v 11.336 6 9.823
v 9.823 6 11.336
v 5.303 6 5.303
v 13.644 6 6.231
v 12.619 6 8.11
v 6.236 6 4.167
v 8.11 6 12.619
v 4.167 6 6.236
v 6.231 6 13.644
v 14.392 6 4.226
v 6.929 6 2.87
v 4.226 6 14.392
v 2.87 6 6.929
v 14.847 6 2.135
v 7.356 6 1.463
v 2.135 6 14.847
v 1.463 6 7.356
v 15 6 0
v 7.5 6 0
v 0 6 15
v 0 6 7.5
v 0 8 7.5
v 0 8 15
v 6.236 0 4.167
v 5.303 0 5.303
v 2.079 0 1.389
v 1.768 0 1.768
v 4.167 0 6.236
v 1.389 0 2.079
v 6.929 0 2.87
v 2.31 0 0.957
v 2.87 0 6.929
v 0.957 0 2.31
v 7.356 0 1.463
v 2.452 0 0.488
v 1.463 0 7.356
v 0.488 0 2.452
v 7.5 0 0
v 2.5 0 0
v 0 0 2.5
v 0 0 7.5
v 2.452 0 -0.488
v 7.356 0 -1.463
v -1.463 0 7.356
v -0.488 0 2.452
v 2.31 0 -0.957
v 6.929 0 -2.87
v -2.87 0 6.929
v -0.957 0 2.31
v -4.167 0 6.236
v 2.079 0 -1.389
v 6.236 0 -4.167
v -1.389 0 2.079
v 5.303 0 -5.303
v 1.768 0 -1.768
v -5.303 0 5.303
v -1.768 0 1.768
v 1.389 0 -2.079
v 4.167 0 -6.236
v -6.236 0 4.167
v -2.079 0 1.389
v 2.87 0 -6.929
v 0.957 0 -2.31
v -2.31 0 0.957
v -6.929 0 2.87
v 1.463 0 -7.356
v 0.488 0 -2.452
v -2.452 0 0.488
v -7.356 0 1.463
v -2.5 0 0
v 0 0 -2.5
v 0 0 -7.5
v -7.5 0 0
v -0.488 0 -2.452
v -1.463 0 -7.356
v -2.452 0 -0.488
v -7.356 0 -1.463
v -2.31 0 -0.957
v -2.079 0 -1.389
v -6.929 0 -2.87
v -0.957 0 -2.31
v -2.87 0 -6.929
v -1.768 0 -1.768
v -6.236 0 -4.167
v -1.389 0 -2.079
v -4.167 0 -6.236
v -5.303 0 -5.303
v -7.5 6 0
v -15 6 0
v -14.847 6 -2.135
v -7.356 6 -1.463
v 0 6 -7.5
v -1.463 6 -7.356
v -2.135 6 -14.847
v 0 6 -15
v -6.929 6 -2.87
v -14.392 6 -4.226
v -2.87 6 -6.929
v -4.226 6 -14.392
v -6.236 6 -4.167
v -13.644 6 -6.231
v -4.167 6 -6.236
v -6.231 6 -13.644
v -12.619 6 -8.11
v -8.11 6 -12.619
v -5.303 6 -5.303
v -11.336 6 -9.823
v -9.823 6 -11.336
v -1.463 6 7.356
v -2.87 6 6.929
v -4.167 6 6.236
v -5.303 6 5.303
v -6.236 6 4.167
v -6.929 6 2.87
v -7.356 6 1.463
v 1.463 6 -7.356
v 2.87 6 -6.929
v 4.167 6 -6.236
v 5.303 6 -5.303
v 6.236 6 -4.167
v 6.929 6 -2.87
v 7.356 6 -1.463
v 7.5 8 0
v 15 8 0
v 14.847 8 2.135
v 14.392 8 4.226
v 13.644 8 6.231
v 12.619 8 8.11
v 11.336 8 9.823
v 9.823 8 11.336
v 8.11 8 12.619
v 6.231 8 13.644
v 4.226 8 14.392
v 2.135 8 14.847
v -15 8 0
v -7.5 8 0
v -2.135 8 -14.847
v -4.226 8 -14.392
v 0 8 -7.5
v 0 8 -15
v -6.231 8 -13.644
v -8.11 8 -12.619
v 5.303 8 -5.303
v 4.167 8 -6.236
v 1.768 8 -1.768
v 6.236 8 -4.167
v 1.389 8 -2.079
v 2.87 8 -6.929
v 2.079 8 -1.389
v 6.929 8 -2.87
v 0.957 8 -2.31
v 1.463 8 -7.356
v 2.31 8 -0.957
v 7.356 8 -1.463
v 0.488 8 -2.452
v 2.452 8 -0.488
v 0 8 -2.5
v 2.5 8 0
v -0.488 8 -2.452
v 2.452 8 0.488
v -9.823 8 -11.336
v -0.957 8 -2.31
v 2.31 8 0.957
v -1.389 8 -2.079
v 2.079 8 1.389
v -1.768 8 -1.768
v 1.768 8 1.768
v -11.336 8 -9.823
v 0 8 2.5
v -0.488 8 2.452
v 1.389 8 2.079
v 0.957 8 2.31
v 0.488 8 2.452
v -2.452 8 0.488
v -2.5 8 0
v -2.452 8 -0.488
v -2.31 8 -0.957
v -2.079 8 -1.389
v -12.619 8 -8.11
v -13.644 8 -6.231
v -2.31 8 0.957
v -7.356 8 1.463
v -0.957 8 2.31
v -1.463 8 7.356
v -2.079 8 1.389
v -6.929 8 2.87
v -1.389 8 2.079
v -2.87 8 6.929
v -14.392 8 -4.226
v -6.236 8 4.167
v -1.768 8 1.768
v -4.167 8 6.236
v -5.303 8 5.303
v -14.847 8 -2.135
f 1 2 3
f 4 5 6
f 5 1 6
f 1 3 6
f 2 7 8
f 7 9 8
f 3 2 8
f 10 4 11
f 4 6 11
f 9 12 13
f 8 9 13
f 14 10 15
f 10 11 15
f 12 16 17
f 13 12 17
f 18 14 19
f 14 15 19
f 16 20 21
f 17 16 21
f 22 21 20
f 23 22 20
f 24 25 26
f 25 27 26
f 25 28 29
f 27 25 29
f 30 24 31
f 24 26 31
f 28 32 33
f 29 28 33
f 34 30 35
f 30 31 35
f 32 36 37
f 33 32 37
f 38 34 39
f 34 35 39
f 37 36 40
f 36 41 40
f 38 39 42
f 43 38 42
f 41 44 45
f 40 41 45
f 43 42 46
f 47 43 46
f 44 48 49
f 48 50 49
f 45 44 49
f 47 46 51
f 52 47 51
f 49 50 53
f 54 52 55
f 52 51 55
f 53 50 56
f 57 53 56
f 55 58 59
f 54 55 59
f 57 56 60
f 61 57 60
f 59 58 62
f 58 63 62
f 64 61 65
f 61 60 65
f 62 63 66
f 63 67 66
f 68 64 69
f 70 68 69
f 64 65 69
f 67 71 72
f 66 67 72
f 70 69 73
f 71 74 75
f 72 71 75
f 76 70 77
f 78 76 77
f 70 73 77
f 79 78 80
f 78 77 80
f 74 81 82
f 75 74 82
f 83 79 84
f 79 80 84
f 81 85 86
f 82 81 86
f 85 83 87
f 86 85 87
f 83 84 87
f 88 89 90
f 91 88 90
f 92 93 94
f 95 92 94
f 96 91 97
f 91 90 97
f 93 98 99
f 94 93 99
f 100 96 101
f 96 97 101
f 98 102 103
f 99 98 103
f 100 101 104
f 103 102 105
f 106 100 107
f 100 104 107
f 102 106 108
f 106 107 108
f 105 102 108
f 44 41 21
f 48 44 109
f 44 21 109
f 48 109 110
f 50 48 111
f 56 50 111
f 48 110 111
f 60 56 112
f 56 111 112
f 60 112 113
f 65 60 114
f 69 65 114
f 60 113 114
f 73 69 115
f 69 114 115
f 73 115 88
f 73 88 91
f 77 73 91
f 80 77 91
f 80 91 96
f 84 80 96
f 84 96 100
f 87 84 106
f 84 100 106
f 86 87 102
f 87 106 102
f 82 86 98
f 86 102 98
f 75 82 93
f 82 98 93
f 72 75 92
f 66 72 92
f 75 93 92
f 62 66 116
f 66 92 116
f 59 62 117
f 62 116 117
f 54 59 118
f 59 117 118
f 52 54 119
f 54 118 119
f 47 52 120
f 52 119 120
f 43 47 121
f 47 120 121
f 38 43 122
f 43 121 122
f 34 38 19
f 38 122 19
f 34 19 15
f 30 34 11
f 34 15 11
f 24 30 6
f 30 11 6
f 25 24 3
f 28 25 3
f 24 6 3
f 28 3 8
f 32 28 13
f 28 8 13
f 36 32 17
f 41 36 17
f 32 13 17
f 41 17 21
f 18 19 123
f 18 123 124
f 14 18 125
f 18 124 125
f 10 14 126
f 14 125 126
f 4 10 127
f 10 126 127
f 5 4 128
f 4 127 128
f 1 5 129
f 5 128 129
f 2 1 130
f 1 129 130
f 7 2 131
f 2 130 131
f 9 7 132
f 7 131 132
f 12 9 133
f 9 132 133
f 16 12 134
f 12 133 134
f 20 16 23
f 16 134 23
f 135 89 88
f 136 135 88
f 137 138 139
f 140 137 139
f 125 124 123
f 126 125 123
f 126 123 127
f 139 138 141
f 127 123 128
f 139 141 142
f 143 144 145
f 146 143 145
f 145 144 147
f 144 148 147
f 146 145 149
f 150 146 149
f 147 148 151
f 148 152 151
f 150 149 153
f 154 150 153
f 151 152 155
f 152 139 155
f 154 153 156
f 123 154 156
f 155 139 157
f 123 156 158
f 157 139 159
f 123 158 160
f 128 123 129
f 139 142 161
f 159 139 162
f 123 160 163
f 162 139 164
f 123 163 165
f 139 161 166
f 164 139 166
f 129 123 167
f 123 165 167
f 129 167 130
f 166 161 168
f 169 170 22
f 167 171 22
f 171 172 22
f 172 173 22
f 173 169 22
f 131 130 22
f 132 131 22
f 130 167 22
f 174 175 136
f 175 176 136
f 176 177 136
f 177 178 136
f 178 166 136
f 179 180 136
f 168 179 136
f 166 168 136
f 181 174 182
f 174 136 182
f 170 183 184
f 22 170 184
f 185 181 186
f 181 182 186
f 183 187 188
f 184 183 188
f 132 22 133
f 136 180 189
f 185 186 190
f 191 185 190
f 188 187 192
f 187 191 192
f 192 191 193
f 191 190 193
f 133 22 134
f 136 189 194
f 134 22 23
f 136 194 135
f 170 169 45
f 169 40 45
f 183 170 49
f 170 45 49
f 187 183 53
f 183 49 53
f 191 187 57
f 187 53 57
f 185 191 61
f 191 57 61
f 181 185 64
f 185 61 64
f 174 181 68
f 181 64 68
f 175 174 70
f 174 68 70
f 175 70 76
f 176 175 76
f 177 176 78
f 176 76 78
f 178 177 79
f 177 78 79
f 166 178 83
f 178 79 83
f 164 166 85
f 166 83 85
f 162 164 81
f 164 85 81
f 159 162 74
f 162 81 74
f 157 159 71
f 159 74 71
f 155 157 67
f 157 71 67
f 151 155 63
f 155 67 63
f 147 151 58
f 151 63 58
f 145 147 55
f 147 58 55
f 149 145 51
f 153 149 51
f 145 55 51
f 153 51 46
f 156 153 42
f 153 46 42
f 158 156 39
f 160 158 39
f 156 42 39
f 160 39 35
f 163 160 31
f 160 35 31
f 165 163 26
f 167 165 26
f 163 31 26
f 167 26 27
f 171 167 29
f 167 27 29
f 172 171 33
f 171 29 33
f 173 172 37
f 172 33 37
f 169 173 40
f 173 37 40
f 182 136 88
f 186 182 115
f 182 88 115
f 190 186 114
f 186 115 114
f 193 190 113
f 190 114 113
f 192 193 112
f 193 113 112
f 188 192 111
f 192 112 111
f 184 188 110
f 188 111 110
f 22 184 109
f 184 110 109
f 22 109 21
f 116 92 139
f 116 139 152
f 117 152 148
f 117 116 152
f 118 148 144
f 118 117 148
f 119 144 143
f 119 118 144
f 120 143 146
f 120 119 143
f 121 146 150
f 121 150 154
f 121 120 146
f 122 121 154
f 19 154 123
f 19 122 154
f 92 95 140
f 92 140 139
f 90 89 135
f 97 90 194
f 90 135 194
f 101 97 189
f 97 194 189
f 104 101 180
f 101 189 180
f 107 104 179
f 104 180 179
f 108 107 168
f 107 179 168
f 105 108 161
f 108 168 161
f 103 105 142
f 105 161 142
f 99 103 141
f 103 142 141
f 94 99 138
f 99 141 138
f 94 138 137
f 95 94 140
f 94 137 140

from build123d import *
from build123d.topology import SkipClean

# Parameters (mm, degrees)
CUT_EXTRUDE1_DEPTH = 23.045407685


with BuildPart() as part:
    # Sketch1 → Revolve1 (revolve)
    with BuildSketch(Plane.XY, mode=Mode.PRIVATE) as revolve1_sk:
        Polygon((2.5, 0), (7.5, 0), (7.5, 6), (15, 6), (15, 8), (2.5, 8), align=None)
    revolve(revolve1_sk.sketch.rotate(Axis((0, 24.642857143, 0), (0, -1, 0)), 90), axis=Axis((0, 24.642857143, 0), (0, -1, 0)))

    # Sketch2 → Cut-Extrude1 (cut, through all)
    with SkipClean():  # the faces are left unmerged after this step: merging them gives an invalid solid
        with BuildSketch(Plane.XZ.offset(-6)):
            with BuildLine():
                Line((0, 7.5), (0, 23.487072106))
                Line((0, 23.487072106), (-23.487072106, 0))
                Line((-23.487072106, 0), (-7.5, 0))
                ThreePointArc((-7.5, 0), (-5.303300859, 5.303300859), (0, 7.5))
            make_face()
            with BuildLine():
                Line((7.5, 0), (23.235513735, 0))
                Line((23.235513735, 0), (0, -21.944820016))
                Line((0, -21.944820016), (0, -7.5))
                ThreePointArc((0, -7.5), (5.303300859, -5.303300859), (7.5, 0))
            make_face()
        extrude(amount=-CUT_EXTRUDE1_DEPTH, mode=Mode.SUBTRACT)


solid = part.part
